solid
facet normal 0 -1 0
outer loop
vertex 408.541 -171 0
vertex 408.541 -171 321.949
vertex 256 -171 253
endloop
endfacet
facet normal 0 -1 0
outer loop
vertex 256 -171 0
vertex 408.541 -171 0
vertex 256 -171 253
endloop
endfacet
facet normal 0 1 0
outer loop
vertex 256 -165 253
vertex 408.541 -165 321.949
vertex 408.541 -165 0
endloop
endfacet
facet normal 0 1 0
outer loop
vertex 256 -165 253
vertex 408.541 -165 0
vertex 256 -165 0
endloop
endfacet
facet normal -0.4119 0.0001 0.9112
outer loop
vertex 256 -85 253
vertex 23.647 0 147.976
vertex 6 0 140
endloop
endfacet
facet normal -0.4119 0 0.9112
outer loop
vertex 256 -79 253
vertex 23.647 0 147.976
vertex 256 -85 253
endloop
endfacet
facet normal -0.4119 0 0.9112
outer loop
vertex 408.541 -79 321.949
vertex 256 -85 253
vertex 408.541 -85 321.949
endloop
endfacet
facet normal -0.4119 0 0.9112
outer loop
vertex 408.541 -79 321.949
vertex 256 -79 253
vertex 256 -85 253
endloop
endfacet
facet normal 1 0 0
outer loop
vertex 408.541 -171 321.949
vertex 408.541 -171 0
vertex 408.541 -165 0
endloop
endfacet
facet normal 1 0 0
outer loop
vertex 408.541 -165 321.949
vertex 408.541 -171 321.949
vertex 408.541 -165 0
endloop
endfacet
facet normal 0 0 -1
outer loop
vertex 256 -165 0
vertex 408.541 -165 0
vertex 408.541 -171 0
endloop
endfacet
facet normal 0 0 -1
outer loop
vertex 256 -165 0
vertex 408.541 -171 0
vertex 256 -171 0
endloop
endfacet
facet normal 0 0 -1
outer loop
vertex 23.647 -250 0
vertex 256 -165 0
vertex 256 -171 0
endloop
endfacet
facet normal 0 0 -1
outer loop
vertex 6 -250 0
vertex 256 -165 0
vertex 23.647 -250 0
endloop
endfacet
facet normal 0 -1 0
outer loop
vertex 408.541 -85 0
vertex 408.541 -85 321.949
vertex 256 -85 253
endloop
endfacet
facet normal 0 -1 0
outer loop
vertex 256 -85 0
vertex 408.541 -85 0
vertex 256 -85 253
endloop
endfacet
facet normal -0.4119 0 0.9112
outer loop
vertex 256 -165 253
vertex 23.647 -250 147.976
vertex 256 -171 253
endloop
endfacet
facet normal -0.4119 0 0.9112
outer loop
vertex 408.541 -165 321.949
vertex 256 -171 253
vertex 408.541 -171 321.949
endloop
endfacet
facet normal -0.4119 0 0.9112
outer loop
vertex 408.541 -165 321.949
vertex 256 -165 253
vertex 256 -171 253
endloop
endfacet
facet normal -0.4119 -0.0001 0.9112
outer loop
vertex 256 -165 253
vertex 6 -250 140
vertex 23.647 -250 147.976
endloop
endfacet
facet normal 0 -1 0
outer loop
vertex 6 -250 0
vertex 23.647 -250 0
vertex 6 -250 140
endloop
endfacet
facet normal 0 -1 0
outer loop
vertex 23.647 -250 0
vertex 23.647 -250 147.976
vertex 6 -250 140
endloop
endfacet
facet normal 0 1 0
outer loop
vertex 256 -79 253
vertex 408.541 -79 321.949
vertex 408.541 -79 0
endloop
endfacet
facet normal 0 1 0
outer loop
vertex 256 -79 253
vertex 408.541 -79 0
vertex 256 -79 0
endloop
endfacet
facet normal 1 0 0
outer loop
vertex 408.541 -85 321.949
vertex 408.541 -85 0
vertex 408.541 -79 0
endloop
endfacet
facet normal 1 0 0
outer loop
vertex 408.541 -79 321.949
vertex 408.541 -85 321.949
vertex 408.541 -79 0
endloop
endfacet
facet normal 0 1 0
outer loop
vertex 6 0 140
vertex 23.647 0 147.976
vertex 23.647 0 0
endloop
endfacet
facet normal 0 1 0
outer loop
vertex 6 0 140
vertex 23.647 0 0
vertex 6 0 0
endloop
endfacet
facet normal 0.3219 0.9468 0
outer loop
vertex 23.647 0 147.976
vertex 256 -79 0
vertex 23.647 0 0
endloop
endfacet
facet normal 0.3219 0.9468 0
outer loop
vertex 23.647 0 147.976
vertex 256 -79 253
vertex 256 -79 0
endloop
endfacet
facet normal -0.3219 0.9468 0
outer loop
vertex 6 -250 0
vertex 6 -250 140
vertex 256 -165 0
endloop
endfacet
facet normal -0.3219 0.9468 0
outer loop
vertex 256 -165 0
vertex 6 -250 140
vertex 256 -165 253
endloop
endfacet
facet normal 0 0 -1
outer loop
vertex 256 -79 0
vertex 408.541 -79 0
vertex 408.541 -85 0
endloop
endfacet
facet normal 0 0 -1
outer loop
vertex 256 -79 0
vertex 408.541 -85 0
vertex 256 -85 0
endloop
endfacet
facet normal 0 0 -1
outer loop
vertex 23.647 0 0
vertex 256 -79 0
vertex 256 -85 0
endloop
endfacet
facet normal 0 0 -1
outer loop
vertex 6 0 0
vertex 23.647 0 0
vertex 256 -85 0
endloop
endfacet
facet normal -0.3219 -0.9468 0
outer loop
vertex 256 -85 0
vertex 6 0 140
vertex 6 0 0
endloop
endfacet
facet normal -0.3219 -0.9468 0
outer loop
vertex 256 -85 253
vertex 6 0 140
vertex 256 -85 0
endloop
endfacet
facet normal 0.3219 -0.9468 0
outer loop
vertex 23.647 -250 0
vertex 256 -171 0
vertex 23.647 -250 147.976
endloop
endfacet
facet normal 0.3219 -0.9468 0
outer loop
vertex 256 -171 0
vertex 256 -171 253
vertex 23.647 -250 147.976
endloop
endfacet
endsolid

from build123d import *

# Parameters (mm, degrees)
ESBO_O1_W                = 6
ESBO_O1_H                = 250
RESSALTO_EXTRUS_O1_DEPTH = 140
RESSALTO_EXTRUS_O2_DEPTH = 250
CORTE_EXTRUS_O2_DEPTH    = 385.234303518
CORTE_EXTRUS_O3_DEPTH    = 385.234303518
RESSALTO_EXTRUS_O3_DEPTH = 140
ESBO_O7_W                = 140
ESBO_O7_H                = 250
CORTE_EXTRUS_O4_DEPTH    = 435.751653246
ESBO_O16_W               = 152.541281031
ESBO_O16_H               = 6
RESSALTO_EXTRUS_O7_DEPTH = 818
ESBO_O18_W               = 875.999462612
ESBO_O18_H               = 418.194526065
CORTE_EXTRUS_O7_DEPTH    = 878.372173794


with BuildPart() as part:
    # Esboço1 → Ressalto-extrusão1 (new body)
    with BuildSketch(Plane.XY):
        with Locations((3, -125)):
            Rectangle(ESBO_O1_W, ESBO_O1_H)
    extrude(amount=RESSALTO_EXTRUS_O1_DEPTH)

    # Esboço7 → Corte-extrusão4 (cut, through all)
    with BuildSketch(Plane(origin=(6, 0, 0), x_dir=(0, 0, -1), z_dir=(1, 0, 0))):
        with Locations((-70, -125)):
            Rectangle(ESBO_O7_W, ESBO_O7_H)
    extrude(amount=-CORTE_EXTRUS_O4_DEPTH, mode=Mode.SUBTRACT)


with BuildPart() as body_2:
    # Esboço3 → Ressalto-extrusão2 (new body)
    with BuildSketch(Plane(origin=(0, 0, 0), x_dir=(1, 0, 0), z_dir=(0, 1, 0))):
        Polygon((6, -140), (256, -253), (256, -140), align=None)
    extrude(amount=-RESSALTO_EXTRUS_O2_DEPTH)

    # Esboço5 → Corte-extrusão2 (cut, through all)
    with BuildSketch(Plane(origin=(0, 0, 140), x_dir=(-1, 0, 0), z_dir=(0, 0, -1))):
        Polygon((-256, -85), (-6, 0), (-6, -250), (-256, -165), align=None)
    extrude(amount=-CORTE_EXTRUS_O2_DEPTH, mode=Mode.SUBTRACT)


with BuildPart() as corte_extrus_o2_piece_1:
    # of the separate pieces the step leaves, piece 1, a body of its own (corte_extrus_o2_pieces)
    add(body_2.part.solids().sort_by_distance((256, -165, 253))[0])


with BuildPart() as corte_extrus_o2_piece_2:
    # of the separate pieces the step leaves, piece 2, a body of its own (corte_extrus_o2_pieces)
    add(body_2.part.solids().sort_by_distance((6, 0, 140))[0])


with BuildPart() as corte_extrus_o3_tool:
    # Esboço6 → Corte-extrusão3 (new, through all)
    with BuildSketch(Plane(origin=(0, 0, 140), x_dir=(-1, 0, 0), z_dir=(0, 0, -1))):
        Polygon((-23.647058824, 0), (-256, 0), (-256, -79), align=None)
        Polygon((-23.647058824, -250), (-256, -171), (-256, -250), align=None)
    extrude(amount=-CORTE_EXTRUS_O3_DEPTH)


with BuildPart() as corte_extrus_o2_piece_1_1:
    add(corte_extrus_o2_piece_1.part)

    # Corte-extrusão3: cut by corte_extrus_o3_tool
    add(corte_extrus_o3_tool.part, mode=Mode.SUBTRACT)


with BuildPart() as corte_extrus_o2_piece_2_1:
    add(corte_extrus_o2_piece_2.part)

    # Corte-extrusão3: cut by corte_extrus_o3_tool
    add(corte_extrus_o3_tool.part, mode=Mode.SUBTRACT)


    add(corte_extrus_o2_piece_1_1.part)  # Ressalto-extrusão3 merges Corte-extrusão2 piece 1
    # Esboço8 → Ressalto-extrusão3 (add)
    with BuildSketch(Plane(origin=(0, 0, 140), x_dir=(-1, 0, 0), z_dir=(0, 0, -1))):
        Polygon((-256, -79), (-23.647058824, 0), (-6, 0), (-256, -85), align=None)
        Polygon((-256, -165), (-256, -171), (-23.647058824, -250), (-6, -250), align=None)
    extrude(amount=RESSALTO_EXTRUS_O3_DEPTH)

    # Esboço16 → Ressalto-extrusão7 (add)
    with BuildSketch(Plane(origin=(0, 0, 0), x_dir=(-1, 0, 0), z_dir=(0, 0, -1))):
        with Locations((-332.270640516, -82)):
            Rectangle(ESBO_O16_W, ESBO_O16_H)
        with Locations((-332.270640516, -168)):
            Rectangle(ESBO_O16_W, ESBO_O16_H)
    extrude(amount=-RESSALTO_EXTRUS_O7_DEPTH)

    # Esboço18 → Corte-extrusão7 (cut, through all)
    with BuildSketch(Plane(origin=(-51.527003149, 0, 113.997794577), x_dir=(0.9112382379380309, 0, 0.41187968354799004), z_dir=(-0.41187968354799004, 0, 0.9112382379380309))):
        with Locations((331.831279582, -101.987624117)):
            Rectangle(ESBO_O18_W, ESBO_O18_H)
    extrude(amount=CORTE_EXTRUS_O7_DEPTH, mode=Mode.SUBTRACT)


solid = corte_extrus_o2_piece_2_1.part
